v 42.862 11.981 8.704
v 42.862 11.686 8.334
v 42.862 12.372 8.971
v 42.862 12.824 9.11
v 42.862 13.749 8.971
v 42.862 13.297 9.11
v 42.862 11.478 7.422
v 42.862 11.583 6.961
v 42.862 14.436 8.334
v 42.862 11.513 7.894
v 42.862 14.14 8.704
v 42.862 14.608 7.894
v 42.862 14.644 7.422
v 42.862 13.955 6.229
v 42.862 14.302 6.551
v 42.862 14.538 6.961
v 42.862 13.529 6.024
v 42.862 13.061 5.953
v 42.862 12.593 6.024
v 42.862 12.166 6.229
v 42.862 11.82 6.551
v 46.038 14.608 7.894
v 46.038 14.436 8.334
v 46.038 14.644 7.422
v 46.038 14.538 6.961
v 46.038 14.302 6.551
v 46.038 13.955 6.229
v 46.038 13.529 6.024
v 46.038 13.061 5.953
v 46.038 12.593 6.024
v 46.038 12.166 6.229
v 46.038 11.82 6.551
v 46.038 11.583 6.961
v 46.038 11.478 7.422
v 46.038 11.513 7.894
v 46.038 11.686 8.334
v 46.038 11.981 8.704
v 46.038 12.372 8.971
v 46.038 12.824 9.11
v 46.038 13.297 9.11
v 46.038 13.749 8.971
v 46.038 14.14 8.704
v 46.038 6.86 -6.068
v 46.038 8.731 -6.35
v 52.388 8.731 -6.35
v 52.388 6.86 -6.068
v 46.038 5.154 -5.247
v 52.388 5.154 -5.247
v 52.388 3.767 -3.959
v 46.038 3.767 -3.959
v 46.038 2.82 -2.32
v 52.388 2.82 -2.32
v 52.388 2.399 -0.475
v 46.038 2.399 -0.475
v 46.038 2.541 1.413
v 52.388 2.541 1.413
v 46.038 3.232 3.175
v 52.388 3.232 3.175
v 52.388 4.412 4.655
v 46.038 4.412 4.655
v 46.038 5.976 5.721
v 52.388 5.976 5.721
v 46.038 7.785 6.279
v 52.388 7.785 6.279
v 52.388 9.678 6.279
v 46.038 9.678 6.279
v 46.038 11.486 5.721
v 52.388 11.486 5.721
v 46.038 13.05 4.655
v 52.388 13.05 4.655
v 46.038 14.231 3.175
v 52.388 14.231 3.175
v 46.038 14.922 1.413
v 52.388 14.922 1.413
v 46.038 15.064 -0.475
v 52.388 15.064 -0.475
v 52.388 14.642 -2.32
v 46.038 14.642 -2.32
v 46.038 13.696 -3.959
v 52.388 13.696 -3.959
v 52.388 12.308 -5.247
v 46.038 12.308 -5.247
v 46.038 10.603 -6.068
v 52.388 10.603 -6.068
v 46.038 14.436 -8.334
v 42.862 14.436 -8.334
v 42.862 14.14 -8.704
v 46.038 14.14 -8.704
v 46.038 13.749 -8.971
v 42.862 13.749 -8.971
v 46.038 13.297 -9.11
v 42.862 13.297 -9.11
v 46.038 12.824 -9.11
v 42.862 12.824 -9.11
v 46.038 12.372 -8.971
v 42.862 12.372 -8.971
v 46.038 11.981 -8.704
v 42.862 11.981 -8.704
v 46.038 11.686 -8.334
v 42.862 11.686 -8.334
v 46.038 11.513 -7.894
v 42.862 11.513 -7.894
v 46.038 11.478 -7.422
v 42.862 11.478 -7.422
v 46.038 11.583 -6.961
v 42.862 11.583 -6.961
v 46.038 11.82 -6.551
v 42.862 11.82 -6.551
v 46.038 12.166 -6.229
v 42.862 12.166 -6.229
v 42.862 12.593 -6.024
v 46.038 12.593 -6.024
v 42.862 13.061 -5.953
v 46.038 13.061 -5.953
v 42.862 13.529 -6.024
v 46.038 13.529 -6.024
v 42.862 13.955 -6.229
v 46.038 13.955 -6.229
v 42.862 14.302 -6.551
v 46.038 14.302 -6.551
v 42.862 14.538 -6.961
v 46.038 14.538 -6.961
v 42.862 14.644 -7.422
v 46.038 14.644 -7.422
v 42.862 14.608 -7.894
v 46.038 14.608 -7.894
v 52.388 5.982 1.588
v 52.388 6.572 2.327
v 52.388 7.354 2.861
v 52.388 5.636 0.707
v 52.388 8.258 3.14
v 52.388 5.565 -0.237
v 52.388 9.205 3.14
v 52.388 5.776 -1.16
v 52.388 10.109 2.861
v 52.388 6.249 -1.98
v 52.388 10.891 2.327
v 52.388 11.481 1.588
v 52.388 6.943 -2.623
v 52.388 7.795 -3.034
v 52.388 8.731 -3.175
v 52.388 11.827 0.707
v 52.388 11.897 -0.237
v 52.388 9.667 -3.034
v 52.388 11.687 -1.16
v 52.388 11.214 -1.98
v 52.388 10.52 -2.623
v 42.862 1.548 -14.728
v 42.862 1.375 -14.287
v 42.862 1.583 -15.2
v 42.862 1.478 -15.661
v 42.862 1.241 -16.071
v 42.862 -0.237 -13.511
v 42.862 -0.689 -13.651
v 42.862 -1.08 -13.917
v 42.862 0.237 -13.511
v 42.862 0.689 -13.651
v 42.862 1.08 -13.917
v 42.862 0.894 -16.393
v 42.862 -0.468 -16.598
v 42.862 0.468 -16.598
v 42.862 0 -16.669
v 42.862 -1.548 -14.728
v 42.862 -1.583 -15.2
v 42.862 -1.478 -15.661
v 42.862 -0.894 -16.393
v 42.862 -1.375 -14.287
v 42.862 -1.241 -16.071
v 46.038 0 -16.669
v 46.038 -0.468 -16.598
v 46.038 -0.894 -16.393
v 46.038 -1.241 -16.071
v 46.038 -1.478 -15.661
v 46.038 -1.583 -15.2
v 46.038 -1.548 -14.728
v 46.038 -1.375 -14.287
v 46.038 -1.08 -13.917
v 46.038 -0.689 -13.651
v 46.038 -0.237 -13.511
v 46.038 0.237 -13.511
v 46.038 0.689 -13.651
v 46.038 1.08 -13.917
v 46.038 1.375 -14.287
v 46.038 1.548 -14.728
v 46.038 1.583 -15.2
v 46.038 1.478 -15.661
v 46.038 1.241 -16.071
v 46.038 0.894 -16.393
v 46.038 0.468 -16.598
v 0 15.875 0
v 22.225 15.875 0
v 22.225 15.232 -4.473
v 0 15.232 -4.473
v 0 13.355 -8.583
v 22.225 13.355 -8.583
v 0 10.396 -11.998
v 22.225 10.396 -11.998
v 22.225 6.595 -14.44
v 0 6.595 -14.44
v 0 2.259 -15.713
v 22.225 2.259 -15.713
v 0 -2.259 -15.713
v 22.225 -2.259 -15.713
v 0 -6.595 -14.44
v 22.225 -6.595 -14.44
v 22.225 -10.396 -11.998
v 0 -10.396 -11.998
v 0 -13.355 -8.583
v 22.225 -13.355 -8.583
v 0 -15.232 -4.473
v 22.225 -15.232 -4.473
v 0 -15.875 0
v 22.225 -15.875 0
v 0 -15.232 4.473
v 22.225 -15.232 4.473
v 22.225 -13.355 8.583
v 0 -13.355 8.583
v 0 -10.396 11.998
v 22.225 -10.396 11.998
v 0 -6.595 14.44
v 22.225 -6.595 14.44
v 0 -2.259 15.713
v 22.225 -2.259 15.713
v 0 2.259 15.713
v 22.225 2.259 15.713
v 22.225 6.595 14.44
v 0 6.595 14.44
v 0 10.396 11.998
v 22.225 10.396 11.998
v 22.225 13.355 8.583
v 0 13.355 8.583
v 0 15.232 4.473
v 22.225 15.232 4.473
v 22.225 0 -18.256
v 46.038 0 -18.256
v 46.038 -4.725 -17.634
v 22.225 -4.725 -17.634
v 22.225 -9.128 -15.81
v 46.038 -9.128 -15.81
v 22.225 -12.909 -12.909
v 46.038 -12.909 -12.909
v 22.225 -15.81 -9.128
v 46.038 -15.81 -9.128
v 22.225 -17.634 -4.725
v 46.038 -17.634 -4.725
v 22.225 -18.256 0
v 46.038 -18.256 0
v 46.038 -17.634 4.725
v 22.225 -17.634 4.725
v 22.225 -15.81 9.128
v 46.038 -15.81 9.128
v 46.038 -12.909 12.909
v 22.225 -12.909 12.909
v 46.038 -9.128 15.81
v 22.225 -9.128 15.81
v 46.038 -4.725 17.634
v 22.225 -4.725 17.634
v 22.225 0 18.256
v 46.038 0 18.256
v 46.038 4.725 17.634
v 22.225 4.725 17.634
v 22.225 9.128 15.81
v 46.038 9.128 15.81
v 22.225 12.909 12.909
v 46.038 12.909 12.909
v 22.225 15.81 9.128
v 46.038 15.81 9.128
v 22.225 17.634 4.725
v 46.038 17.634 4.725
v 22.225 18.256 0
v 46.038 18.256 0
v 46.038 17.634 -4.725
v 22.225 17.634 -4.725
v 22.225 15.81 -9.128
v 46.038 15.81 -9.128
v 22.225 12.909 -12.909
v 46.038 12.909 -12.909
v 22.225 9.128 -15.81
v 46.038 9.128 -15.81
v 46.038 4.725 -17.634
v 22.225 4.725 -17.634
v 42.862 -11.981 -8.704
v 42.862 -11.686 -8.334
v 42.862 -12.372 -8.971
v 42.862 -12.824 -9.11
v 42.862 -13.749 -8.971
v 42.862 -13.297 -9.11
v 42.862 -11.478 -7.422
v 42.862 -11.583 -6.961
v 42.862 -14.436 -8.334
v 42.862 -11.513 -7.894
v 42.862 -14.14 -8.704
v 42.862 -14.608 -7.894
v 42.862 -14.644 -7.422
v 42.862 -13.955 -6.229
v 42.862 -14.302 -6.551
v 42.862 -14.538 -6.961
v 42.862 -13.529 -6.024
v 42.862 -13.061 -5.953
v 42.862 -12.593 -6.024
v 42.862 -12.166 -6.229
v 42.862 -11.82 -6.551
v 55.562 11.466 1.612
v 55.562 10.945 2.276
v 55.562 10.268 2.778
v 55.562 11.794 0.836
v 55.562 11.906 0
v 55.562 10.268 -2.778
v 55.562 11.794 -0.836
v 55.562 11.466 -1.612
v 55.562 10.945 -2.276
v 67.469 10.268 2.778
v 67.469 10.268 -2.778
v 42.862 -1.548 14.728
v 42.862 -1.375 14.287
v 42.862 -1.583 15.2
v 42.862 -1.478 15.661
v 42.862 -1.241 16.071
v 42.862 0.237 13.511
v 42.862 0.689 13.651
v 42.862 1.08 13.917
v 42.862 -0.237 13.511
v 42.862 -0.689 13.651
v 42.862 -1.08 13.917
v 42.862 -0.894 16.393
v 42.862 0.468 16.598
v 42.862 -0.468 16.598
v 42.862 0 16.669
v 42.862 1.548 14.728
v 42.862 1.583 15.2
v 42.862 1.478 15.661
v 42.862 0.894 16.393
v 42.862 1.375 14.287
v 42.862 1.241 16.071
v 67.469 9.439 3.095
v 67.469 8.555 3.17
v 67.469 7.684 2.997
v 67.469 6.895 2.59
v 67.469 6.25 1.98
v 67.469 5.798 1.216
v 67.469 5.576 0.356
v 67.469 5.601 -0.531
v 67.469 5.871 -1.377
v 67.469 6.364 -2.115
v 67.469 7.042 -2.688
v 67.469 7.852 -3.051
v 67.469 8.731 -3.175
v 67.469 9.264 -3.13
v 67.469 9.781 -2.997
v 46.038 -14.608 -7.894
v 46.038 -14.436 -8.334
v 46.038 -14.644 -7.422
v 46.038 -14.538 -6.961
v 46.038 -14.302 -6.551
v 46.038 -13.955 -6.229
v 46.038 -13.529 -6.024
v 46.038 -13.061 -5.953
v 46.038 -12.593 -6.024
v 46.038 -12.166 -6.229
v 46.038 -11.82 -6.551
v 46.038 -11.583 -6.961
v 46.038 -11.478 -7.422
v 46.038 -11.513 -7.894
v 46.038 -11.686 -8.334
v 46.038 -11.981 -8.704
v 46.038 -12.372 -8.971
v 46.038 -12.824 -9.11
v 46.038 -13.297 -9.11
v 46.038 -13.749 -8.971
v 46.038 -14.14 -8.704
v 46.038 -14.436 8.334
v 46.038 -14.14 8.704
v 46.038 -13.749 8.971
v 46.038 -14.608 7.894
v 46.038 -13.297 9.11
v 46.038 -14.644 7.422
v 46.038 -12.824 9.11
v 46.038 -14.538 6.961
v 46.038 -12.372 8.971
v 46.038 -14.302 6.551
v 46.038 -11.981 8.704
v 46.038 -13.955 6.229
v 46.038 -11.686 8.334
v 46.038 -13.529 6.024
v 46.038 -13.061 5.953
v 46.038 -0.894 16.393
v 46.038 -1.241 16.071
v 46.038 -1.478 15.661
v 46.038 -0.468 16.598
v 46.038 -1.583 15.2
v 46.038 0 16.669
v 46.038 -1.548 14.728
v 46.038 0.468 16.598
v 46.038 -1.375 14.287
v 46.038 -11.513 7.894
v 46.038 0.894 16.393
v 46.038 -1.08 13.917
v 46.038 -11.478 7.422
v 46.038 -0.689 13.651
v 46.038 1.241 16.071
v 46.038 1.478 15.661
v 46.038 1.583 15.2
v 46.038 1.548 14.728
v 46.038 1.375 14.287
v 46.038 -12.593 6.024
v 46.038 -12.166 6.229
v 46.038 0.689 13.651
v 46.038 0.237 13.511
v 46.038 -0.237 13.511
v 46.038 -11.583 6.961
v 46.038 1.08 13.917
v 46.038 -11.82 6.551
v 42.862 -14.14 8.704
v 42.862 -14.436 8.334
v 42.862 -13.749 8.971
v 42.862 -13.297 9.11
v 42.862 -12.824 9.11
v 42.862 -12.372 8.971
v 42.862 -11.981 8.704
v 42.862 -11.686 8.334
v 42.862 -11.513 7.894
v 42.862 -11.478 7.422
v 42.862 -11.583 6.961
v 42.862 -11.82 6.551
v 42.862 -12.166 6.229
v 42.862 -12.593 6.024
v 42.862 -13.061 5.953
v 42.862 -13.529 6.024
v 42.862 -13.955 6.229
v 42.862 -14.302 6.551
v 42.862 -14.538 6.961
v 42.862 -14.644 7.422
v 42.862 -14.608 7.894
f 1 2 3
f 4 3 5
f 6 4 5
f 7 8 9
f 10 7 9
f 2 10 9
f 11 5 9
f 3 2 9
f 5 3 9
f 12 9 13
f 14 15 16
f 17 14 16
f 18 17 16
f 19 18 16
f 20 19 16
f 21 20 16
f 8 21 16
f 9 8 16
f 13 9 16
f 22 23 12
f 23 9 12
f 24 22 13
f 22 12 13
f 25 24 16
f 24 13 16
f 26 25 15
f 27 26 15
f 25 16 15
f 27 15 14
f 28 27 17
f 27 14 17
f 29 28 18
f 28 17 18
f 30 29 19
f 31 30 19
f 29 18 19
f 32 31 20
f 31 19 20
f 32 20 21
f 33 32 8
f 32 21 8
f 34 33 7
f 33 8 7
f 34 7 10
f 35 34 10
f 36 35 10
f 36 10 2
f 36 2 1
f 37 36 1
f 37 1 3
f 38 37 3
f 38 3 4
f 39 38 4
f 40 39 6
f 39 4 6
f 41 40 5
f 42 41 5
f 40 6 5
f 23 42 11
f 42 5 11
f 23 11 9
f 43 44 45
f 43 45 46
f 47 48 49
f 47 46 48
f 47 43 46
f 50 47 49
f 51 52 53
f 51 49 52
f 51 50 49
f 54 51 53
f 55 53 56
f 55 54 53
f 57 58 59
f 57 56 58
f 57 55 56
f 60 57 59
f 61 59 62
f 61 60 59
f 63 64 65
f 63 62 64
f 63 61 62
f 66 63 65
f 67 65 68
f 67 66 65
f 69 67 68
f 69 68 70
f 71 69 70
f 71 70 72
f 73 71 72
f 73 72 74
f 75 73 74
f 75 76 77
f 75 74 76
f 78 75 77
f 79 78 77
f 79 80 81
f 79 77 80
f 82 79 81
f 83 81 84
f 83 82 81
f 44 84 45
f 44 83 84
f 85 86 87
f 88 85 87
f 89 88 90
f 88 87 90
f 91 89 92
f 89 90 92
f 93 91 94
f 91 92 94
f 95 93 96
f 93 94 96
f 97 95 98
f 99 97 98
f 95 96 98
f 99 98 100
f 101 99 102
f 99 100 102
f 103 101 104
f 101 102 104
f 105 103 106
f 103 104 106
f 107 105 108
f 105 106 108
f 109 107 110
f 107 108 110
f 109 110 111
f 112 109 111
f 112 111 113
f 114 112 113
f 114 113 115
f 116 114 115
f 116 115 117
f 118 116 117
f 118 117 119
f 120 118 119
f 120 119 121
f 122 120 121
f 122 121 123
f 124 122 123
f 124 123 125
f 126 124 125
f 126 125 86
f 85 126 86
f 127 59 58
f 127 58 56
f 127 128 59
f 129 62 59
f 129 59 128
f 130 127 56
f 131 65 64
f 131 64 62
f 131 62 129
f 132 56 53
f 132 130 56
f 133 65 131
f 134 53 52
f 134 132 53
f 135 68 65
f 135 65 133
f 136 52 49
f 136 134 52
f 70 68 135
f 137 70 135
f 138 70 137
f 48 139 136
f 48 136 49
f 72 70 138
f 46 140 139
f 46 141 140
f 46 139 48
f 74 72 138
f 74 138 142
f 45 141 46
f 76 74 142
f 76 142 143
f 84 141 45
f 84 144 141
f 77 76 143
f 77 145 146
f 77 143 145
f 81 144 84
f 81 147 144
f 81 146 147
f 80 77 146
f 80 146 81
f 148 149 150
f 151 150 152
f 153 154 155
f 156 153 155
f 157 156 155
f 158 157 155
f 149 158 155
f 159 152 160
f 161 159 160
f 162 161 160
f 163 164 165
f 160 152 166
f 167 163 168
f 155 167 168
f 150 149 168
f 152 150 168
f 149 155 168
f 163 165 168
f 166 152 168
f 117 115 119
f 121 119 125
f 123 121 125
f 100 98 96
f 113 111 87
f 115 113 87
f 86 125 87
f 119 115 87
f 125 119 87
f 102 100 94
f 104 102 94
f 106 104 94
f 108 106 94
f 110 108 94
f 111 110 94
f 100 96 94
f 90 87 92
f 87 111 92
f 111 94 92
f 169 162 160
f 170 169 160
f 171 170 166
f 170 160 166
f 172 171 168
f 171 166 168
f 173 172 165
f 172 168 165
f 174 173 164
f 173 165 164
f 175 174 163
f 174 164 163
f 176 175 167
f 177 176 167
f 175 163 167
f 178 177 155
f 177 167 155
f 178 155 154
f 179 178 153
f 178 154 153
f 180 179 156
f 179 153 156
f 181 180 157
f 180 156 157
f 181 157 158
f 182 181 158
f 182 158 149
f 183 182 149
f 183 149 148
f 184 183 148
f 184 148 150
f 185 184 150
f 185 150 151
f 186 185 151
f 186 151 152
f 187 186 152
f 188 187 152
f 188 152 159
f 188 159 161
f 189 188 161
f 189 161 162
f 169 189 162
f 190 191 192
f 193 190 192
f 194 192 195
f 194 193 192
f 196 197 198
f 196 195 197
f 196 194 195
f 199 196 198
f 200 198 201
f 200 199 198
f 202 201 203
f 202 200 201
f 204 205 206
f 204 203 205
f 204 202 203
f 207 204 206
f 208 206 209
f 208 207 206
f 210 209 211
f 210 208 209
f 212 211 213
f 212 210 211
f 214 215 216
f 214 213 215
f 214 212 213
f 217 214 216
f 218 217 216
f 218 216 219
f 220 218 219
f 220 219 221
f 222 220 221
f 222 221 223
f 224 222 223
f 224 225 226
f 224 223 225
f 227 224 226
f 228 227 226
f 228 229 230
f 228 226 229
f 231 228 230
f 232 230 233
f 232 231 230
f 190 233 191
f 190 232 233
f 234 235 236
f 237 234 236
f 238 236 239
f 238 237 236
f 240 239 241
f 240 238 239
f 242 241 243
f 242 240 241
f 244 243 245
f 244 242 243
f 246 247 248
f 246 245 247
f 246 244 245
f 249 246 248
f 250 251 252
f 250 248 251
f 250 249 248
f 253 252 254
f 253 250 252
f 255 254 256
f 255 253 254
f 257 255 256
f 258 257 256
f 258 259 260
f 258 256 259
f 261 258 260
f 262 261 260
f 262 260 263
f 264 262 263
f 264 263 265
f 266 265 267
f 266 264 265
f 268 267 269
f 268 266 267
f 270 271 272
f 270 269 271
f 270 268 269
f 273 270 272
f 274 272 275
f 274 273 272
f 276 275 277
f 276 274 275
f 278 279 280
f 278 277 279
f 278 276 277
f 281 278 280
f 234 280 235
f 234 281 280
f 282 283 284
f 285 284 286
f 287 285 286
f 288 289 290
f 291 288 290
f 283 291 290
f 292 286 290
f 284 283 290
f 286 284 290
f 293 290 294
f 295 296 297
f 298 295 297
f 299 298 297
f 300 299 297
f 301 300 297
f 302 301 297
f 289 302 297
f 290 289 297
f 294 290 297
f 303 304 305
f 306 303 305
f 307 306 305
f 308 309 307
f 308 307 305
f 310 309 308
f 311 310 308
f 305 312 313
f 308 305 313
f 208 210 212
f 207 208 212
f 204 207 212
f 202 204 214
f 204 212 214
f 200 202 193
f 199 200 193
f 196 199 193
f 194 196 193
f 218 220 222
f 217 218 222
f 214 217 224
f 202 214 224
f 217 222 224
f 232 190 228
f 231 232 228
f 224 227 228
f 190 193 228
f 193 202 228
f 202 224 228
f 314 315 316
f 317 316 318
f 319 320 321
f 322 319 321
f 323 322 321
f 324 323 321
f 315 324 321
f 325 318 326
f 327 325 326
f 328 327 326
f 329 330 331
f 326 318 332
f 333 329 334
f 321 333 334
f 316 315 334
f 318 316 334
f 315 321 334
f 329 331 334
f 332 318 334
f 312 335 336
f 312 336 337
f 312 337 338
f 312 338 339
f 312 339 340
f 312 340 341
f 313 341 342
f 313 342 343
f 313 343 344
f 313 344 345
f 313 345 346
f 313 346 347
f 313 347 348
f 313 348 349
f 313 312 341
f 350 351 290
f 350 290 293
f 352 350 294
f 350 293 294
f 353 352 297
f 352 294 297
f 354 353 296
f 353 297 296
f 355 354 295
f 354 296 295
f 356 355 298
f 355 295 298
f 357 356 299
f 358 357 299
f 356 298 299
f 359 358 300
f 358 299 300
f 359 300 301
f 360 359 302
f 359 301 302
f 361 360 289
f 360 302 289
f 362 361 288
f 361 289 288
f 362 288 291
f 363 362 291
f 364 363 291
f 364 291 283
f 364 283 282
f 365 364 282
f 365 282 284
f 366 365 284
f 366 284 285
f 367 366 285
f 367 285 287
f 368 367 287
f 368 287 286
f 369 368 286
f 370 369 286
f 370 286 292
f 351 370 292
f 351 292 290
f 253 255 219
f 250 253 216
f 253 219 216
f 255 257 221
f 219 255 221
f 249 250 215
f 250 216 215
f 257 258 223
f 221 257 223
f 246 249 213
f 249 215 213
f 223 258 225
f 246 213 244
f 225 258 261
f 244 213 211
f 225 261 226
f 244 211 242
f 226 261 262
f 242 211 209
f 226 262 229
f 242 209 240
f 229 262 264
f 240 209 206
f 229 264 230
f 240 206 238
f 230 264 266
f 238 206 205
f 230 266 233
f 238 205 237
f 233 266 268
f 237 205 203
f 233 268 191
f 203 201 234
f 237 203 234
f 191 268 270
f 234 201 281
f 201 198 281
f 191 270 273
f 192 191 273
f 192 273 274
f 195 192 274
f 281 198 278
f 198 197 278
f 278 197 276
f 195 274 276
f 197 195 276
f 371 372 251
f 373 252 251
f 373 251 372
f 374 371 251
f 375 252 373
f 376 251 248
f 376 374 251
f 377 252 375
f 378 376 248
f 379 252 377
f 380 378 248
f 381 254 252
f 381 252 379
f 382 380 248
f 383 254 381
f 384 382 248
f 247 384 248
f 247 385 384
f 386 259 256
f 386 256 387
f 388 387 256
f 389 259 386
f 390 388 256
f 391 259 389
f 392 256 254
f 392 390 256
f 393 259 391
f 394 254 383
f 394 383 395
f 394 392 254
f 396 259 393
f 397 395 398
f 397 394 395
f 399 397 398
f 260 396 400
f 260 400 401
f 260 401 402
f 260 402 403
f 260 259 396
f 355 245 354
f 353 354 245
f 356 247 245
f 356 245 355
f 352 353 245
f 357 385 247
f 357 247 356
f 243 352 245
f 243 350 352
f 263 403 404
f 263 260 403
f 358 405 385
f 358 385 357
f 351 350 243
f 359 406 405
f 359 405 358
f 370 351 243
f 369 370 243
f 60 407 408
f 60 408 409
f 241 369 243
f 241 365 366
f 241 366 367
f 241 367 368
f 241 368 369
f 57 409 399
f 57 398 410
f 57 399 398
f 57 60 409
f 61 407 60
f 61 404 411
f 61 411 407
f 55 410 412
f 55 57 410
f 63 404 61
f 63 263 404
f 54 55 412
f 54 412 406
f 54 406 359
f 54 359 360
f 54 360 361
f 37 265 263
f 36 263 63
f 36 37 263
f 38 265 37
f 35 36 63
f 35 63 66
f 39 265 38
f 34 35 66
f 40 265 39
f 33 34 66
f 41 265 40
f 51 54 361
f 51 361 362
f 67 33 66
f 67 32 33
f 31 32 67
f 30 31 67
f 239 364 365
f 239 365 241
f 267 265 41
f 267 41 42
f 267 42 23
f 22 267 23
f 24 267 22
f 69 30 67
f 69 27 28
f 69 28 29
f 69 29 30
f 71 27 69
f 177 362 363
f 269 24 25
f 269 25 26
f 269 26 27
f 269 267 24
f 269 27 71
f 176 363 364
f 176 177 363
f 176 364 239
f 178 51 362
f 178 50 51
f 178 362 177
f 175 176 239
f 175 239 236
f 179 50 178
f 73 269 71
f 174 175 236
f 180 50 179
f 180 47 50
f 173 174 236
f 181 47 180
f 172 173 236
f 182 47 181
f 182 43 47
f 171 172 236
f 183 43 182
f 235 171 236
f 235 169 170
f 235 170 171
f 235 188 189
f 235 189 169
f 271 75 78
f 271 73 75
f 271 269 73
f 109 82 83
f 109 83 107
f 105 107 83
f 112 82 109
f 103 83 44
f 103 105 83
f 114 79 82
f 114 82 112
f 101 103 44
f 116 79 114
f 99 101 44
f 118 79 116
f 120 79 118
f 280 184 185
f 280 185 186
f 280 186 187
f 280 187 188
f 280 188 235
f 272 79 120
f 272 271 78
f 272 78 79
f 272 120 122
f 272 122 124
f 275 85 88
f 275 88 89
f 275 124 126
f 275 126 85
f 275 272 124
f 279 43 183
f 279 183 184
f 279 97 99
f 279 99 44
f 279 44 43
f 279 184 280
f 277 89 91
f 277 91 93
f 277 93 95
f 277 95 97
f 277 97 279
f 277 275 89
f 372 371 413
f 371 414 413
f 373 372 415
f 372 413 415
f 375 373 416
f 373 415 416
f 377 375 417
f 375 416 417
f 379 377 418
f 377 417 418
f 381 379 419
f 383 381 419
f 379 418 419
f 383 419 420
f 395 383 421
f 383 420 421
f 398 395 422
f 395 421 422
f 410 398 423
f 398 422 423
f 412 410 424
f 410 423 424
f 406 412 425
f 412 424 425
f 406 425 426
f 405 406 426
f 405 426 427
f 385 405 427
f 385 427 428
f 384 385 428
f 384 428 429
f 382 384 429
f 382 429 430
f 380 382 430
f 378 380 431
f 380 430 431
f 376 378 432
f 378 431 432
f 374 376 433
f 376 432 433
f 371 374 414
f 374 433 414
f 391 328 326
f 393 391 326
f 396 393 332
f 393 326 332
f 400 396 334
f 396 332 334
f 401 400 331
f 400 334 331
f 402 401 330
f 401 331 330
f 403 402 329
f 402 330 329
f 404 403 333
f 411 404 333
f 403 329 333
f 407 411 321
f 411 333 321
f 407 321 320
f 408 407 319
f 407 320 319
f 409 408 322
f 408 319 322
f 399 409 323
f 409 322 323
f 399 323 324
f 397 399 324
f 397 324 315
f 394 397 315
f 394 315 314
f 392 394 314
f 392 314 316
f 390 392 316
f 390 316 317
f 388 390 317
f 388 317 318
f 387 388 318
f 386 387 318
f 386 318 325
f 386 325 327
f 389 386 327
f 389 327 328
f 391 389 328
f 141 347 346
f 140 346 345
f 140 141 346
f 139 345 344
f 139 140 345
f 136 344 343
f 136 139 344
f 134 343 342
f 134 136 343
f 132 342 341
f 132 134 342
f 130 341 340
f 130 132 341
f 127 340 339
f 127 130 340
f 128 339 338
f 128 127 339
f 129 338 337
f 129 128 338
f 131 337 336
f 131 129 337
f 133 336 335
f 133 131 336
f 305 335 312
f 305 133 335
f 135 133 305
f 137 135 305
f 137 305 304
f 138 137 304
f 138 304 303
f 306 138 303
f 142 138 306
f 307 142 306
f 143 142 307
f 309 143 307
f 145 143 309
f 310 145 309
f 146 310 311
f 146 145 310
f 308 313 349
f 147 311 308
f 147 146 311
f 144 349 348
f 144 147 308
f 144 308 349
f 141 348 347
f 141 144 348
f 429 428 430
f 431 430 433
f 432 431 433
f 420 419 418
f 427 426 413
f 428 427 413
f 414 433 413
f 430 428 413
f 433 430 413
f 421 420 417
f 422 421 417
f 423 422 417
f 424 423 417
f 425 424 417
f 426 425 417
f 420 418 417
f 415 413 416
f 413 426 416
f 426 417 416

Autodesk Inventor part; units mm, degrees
ref_plane "YZ Plane" through (0, 0, 0) normal (1, 0, 0) x (0, 1, 0)
ref_plane "XZ Plane" through (0, 0, 0) normal (0, 1, 0) x (-1, 0, 0)
ref_plane "XY Plane" through (0, 0, 0) normal (0, 0, 1) x (1, 0, 0)
sketch "Sketch1" plane through (0, 0, 0) normal (1, 0, 0) x (0, 1, 0)
  circle A0 centre (0, 0) radius 15.875
  dimension "d0" = 31.75
extrude "Extrusion1" add sketch "Sketch1" along normal blind 22.225
sketch "Sketch2" plane through (22.225, 0, 0) normal (1, 0, 0) x (0, 0, -1)
  circle A0 centre (0, 0) radius 15.875 construction
  circle A1 centre (0, 0) radius 18.2563
  dimension "d3" = 36.5125
extrude "Extrusion2" add sketch "Sketch2" along normal blind 23.8125
sketch "Sketch3" plane through (46.0375, 0, 0) normal (1, 0, 0) x (0, 0, -1)
  circle A0 centre (0, 8.7313) radius 6.35
  circle A1 centre (0, 8.7313) radius 8.7313 construction
  line L0 (0, -25.5588) -> (0, 25.5588) construction
  point P0 (0, 0)
  dimension "d13" = 17.4625
  dimension "d7" = 12.7
extrude "Extrusion3" add sketch "Sketch3" along normal blind 6.35
sketch "Sketch4" plane through (52.3875, 8.7313, 0) normal (1, 0, 0) x (0, 0, -1)
  circle A0 centre (0, 0) radius 3.175
  circle A1 centre (0, 0) radius 6.35 construction
  point P0 (0, -8.7313)
  dimension "d10" = 6.35
extrude "Extrusion4" add sketch "Sketch4" along normal blind 15.0812
sketch "Sketch5" plane through (46.0375, 0, 0) normal (1, 0, 0) x (0, 0, -1)
  circle A0 centre (0, 0) radius 15.0812 construction
  line L0 (25.5588, 0) -> (-25.5588, 0) construction
  point P0 (15.0812, 0)
  dimension "d14" = 30.1625
hole "Hole1" at (46.0375, 0, -15.0812) direction (-1, 0, 0) diameter 3.175 depth 3.175
pattern_circular "Circular Pattern1" count 6 over 360 about axis through (-10, 0, 0) along (1, 0, 0) of "Hole1"
sketch "Sketch6" plane through (67.4687, 8.7313, 0) normal (1, 0, 0) x (0, 0, -1)
  circle A0 centre (0, 0) radius 3.175 construction
  line L0 (-2.7781, 1.5371) -> (2.7781, 1.5371)
  arc A1 (2.7781, 1.5371) -> (-2.7781, 1.5371) centre (0, 0) ccw
  point P0 (0, -8.7313)
  dimension "d25" = 5.5563
extrude "Extrusion5" cut sketch "Sketch6" against normal blind 11.9062
properties part number "Nextrox-Mini-12VDC-60rpmGearbox-Motor" material "Stainless Steel"
